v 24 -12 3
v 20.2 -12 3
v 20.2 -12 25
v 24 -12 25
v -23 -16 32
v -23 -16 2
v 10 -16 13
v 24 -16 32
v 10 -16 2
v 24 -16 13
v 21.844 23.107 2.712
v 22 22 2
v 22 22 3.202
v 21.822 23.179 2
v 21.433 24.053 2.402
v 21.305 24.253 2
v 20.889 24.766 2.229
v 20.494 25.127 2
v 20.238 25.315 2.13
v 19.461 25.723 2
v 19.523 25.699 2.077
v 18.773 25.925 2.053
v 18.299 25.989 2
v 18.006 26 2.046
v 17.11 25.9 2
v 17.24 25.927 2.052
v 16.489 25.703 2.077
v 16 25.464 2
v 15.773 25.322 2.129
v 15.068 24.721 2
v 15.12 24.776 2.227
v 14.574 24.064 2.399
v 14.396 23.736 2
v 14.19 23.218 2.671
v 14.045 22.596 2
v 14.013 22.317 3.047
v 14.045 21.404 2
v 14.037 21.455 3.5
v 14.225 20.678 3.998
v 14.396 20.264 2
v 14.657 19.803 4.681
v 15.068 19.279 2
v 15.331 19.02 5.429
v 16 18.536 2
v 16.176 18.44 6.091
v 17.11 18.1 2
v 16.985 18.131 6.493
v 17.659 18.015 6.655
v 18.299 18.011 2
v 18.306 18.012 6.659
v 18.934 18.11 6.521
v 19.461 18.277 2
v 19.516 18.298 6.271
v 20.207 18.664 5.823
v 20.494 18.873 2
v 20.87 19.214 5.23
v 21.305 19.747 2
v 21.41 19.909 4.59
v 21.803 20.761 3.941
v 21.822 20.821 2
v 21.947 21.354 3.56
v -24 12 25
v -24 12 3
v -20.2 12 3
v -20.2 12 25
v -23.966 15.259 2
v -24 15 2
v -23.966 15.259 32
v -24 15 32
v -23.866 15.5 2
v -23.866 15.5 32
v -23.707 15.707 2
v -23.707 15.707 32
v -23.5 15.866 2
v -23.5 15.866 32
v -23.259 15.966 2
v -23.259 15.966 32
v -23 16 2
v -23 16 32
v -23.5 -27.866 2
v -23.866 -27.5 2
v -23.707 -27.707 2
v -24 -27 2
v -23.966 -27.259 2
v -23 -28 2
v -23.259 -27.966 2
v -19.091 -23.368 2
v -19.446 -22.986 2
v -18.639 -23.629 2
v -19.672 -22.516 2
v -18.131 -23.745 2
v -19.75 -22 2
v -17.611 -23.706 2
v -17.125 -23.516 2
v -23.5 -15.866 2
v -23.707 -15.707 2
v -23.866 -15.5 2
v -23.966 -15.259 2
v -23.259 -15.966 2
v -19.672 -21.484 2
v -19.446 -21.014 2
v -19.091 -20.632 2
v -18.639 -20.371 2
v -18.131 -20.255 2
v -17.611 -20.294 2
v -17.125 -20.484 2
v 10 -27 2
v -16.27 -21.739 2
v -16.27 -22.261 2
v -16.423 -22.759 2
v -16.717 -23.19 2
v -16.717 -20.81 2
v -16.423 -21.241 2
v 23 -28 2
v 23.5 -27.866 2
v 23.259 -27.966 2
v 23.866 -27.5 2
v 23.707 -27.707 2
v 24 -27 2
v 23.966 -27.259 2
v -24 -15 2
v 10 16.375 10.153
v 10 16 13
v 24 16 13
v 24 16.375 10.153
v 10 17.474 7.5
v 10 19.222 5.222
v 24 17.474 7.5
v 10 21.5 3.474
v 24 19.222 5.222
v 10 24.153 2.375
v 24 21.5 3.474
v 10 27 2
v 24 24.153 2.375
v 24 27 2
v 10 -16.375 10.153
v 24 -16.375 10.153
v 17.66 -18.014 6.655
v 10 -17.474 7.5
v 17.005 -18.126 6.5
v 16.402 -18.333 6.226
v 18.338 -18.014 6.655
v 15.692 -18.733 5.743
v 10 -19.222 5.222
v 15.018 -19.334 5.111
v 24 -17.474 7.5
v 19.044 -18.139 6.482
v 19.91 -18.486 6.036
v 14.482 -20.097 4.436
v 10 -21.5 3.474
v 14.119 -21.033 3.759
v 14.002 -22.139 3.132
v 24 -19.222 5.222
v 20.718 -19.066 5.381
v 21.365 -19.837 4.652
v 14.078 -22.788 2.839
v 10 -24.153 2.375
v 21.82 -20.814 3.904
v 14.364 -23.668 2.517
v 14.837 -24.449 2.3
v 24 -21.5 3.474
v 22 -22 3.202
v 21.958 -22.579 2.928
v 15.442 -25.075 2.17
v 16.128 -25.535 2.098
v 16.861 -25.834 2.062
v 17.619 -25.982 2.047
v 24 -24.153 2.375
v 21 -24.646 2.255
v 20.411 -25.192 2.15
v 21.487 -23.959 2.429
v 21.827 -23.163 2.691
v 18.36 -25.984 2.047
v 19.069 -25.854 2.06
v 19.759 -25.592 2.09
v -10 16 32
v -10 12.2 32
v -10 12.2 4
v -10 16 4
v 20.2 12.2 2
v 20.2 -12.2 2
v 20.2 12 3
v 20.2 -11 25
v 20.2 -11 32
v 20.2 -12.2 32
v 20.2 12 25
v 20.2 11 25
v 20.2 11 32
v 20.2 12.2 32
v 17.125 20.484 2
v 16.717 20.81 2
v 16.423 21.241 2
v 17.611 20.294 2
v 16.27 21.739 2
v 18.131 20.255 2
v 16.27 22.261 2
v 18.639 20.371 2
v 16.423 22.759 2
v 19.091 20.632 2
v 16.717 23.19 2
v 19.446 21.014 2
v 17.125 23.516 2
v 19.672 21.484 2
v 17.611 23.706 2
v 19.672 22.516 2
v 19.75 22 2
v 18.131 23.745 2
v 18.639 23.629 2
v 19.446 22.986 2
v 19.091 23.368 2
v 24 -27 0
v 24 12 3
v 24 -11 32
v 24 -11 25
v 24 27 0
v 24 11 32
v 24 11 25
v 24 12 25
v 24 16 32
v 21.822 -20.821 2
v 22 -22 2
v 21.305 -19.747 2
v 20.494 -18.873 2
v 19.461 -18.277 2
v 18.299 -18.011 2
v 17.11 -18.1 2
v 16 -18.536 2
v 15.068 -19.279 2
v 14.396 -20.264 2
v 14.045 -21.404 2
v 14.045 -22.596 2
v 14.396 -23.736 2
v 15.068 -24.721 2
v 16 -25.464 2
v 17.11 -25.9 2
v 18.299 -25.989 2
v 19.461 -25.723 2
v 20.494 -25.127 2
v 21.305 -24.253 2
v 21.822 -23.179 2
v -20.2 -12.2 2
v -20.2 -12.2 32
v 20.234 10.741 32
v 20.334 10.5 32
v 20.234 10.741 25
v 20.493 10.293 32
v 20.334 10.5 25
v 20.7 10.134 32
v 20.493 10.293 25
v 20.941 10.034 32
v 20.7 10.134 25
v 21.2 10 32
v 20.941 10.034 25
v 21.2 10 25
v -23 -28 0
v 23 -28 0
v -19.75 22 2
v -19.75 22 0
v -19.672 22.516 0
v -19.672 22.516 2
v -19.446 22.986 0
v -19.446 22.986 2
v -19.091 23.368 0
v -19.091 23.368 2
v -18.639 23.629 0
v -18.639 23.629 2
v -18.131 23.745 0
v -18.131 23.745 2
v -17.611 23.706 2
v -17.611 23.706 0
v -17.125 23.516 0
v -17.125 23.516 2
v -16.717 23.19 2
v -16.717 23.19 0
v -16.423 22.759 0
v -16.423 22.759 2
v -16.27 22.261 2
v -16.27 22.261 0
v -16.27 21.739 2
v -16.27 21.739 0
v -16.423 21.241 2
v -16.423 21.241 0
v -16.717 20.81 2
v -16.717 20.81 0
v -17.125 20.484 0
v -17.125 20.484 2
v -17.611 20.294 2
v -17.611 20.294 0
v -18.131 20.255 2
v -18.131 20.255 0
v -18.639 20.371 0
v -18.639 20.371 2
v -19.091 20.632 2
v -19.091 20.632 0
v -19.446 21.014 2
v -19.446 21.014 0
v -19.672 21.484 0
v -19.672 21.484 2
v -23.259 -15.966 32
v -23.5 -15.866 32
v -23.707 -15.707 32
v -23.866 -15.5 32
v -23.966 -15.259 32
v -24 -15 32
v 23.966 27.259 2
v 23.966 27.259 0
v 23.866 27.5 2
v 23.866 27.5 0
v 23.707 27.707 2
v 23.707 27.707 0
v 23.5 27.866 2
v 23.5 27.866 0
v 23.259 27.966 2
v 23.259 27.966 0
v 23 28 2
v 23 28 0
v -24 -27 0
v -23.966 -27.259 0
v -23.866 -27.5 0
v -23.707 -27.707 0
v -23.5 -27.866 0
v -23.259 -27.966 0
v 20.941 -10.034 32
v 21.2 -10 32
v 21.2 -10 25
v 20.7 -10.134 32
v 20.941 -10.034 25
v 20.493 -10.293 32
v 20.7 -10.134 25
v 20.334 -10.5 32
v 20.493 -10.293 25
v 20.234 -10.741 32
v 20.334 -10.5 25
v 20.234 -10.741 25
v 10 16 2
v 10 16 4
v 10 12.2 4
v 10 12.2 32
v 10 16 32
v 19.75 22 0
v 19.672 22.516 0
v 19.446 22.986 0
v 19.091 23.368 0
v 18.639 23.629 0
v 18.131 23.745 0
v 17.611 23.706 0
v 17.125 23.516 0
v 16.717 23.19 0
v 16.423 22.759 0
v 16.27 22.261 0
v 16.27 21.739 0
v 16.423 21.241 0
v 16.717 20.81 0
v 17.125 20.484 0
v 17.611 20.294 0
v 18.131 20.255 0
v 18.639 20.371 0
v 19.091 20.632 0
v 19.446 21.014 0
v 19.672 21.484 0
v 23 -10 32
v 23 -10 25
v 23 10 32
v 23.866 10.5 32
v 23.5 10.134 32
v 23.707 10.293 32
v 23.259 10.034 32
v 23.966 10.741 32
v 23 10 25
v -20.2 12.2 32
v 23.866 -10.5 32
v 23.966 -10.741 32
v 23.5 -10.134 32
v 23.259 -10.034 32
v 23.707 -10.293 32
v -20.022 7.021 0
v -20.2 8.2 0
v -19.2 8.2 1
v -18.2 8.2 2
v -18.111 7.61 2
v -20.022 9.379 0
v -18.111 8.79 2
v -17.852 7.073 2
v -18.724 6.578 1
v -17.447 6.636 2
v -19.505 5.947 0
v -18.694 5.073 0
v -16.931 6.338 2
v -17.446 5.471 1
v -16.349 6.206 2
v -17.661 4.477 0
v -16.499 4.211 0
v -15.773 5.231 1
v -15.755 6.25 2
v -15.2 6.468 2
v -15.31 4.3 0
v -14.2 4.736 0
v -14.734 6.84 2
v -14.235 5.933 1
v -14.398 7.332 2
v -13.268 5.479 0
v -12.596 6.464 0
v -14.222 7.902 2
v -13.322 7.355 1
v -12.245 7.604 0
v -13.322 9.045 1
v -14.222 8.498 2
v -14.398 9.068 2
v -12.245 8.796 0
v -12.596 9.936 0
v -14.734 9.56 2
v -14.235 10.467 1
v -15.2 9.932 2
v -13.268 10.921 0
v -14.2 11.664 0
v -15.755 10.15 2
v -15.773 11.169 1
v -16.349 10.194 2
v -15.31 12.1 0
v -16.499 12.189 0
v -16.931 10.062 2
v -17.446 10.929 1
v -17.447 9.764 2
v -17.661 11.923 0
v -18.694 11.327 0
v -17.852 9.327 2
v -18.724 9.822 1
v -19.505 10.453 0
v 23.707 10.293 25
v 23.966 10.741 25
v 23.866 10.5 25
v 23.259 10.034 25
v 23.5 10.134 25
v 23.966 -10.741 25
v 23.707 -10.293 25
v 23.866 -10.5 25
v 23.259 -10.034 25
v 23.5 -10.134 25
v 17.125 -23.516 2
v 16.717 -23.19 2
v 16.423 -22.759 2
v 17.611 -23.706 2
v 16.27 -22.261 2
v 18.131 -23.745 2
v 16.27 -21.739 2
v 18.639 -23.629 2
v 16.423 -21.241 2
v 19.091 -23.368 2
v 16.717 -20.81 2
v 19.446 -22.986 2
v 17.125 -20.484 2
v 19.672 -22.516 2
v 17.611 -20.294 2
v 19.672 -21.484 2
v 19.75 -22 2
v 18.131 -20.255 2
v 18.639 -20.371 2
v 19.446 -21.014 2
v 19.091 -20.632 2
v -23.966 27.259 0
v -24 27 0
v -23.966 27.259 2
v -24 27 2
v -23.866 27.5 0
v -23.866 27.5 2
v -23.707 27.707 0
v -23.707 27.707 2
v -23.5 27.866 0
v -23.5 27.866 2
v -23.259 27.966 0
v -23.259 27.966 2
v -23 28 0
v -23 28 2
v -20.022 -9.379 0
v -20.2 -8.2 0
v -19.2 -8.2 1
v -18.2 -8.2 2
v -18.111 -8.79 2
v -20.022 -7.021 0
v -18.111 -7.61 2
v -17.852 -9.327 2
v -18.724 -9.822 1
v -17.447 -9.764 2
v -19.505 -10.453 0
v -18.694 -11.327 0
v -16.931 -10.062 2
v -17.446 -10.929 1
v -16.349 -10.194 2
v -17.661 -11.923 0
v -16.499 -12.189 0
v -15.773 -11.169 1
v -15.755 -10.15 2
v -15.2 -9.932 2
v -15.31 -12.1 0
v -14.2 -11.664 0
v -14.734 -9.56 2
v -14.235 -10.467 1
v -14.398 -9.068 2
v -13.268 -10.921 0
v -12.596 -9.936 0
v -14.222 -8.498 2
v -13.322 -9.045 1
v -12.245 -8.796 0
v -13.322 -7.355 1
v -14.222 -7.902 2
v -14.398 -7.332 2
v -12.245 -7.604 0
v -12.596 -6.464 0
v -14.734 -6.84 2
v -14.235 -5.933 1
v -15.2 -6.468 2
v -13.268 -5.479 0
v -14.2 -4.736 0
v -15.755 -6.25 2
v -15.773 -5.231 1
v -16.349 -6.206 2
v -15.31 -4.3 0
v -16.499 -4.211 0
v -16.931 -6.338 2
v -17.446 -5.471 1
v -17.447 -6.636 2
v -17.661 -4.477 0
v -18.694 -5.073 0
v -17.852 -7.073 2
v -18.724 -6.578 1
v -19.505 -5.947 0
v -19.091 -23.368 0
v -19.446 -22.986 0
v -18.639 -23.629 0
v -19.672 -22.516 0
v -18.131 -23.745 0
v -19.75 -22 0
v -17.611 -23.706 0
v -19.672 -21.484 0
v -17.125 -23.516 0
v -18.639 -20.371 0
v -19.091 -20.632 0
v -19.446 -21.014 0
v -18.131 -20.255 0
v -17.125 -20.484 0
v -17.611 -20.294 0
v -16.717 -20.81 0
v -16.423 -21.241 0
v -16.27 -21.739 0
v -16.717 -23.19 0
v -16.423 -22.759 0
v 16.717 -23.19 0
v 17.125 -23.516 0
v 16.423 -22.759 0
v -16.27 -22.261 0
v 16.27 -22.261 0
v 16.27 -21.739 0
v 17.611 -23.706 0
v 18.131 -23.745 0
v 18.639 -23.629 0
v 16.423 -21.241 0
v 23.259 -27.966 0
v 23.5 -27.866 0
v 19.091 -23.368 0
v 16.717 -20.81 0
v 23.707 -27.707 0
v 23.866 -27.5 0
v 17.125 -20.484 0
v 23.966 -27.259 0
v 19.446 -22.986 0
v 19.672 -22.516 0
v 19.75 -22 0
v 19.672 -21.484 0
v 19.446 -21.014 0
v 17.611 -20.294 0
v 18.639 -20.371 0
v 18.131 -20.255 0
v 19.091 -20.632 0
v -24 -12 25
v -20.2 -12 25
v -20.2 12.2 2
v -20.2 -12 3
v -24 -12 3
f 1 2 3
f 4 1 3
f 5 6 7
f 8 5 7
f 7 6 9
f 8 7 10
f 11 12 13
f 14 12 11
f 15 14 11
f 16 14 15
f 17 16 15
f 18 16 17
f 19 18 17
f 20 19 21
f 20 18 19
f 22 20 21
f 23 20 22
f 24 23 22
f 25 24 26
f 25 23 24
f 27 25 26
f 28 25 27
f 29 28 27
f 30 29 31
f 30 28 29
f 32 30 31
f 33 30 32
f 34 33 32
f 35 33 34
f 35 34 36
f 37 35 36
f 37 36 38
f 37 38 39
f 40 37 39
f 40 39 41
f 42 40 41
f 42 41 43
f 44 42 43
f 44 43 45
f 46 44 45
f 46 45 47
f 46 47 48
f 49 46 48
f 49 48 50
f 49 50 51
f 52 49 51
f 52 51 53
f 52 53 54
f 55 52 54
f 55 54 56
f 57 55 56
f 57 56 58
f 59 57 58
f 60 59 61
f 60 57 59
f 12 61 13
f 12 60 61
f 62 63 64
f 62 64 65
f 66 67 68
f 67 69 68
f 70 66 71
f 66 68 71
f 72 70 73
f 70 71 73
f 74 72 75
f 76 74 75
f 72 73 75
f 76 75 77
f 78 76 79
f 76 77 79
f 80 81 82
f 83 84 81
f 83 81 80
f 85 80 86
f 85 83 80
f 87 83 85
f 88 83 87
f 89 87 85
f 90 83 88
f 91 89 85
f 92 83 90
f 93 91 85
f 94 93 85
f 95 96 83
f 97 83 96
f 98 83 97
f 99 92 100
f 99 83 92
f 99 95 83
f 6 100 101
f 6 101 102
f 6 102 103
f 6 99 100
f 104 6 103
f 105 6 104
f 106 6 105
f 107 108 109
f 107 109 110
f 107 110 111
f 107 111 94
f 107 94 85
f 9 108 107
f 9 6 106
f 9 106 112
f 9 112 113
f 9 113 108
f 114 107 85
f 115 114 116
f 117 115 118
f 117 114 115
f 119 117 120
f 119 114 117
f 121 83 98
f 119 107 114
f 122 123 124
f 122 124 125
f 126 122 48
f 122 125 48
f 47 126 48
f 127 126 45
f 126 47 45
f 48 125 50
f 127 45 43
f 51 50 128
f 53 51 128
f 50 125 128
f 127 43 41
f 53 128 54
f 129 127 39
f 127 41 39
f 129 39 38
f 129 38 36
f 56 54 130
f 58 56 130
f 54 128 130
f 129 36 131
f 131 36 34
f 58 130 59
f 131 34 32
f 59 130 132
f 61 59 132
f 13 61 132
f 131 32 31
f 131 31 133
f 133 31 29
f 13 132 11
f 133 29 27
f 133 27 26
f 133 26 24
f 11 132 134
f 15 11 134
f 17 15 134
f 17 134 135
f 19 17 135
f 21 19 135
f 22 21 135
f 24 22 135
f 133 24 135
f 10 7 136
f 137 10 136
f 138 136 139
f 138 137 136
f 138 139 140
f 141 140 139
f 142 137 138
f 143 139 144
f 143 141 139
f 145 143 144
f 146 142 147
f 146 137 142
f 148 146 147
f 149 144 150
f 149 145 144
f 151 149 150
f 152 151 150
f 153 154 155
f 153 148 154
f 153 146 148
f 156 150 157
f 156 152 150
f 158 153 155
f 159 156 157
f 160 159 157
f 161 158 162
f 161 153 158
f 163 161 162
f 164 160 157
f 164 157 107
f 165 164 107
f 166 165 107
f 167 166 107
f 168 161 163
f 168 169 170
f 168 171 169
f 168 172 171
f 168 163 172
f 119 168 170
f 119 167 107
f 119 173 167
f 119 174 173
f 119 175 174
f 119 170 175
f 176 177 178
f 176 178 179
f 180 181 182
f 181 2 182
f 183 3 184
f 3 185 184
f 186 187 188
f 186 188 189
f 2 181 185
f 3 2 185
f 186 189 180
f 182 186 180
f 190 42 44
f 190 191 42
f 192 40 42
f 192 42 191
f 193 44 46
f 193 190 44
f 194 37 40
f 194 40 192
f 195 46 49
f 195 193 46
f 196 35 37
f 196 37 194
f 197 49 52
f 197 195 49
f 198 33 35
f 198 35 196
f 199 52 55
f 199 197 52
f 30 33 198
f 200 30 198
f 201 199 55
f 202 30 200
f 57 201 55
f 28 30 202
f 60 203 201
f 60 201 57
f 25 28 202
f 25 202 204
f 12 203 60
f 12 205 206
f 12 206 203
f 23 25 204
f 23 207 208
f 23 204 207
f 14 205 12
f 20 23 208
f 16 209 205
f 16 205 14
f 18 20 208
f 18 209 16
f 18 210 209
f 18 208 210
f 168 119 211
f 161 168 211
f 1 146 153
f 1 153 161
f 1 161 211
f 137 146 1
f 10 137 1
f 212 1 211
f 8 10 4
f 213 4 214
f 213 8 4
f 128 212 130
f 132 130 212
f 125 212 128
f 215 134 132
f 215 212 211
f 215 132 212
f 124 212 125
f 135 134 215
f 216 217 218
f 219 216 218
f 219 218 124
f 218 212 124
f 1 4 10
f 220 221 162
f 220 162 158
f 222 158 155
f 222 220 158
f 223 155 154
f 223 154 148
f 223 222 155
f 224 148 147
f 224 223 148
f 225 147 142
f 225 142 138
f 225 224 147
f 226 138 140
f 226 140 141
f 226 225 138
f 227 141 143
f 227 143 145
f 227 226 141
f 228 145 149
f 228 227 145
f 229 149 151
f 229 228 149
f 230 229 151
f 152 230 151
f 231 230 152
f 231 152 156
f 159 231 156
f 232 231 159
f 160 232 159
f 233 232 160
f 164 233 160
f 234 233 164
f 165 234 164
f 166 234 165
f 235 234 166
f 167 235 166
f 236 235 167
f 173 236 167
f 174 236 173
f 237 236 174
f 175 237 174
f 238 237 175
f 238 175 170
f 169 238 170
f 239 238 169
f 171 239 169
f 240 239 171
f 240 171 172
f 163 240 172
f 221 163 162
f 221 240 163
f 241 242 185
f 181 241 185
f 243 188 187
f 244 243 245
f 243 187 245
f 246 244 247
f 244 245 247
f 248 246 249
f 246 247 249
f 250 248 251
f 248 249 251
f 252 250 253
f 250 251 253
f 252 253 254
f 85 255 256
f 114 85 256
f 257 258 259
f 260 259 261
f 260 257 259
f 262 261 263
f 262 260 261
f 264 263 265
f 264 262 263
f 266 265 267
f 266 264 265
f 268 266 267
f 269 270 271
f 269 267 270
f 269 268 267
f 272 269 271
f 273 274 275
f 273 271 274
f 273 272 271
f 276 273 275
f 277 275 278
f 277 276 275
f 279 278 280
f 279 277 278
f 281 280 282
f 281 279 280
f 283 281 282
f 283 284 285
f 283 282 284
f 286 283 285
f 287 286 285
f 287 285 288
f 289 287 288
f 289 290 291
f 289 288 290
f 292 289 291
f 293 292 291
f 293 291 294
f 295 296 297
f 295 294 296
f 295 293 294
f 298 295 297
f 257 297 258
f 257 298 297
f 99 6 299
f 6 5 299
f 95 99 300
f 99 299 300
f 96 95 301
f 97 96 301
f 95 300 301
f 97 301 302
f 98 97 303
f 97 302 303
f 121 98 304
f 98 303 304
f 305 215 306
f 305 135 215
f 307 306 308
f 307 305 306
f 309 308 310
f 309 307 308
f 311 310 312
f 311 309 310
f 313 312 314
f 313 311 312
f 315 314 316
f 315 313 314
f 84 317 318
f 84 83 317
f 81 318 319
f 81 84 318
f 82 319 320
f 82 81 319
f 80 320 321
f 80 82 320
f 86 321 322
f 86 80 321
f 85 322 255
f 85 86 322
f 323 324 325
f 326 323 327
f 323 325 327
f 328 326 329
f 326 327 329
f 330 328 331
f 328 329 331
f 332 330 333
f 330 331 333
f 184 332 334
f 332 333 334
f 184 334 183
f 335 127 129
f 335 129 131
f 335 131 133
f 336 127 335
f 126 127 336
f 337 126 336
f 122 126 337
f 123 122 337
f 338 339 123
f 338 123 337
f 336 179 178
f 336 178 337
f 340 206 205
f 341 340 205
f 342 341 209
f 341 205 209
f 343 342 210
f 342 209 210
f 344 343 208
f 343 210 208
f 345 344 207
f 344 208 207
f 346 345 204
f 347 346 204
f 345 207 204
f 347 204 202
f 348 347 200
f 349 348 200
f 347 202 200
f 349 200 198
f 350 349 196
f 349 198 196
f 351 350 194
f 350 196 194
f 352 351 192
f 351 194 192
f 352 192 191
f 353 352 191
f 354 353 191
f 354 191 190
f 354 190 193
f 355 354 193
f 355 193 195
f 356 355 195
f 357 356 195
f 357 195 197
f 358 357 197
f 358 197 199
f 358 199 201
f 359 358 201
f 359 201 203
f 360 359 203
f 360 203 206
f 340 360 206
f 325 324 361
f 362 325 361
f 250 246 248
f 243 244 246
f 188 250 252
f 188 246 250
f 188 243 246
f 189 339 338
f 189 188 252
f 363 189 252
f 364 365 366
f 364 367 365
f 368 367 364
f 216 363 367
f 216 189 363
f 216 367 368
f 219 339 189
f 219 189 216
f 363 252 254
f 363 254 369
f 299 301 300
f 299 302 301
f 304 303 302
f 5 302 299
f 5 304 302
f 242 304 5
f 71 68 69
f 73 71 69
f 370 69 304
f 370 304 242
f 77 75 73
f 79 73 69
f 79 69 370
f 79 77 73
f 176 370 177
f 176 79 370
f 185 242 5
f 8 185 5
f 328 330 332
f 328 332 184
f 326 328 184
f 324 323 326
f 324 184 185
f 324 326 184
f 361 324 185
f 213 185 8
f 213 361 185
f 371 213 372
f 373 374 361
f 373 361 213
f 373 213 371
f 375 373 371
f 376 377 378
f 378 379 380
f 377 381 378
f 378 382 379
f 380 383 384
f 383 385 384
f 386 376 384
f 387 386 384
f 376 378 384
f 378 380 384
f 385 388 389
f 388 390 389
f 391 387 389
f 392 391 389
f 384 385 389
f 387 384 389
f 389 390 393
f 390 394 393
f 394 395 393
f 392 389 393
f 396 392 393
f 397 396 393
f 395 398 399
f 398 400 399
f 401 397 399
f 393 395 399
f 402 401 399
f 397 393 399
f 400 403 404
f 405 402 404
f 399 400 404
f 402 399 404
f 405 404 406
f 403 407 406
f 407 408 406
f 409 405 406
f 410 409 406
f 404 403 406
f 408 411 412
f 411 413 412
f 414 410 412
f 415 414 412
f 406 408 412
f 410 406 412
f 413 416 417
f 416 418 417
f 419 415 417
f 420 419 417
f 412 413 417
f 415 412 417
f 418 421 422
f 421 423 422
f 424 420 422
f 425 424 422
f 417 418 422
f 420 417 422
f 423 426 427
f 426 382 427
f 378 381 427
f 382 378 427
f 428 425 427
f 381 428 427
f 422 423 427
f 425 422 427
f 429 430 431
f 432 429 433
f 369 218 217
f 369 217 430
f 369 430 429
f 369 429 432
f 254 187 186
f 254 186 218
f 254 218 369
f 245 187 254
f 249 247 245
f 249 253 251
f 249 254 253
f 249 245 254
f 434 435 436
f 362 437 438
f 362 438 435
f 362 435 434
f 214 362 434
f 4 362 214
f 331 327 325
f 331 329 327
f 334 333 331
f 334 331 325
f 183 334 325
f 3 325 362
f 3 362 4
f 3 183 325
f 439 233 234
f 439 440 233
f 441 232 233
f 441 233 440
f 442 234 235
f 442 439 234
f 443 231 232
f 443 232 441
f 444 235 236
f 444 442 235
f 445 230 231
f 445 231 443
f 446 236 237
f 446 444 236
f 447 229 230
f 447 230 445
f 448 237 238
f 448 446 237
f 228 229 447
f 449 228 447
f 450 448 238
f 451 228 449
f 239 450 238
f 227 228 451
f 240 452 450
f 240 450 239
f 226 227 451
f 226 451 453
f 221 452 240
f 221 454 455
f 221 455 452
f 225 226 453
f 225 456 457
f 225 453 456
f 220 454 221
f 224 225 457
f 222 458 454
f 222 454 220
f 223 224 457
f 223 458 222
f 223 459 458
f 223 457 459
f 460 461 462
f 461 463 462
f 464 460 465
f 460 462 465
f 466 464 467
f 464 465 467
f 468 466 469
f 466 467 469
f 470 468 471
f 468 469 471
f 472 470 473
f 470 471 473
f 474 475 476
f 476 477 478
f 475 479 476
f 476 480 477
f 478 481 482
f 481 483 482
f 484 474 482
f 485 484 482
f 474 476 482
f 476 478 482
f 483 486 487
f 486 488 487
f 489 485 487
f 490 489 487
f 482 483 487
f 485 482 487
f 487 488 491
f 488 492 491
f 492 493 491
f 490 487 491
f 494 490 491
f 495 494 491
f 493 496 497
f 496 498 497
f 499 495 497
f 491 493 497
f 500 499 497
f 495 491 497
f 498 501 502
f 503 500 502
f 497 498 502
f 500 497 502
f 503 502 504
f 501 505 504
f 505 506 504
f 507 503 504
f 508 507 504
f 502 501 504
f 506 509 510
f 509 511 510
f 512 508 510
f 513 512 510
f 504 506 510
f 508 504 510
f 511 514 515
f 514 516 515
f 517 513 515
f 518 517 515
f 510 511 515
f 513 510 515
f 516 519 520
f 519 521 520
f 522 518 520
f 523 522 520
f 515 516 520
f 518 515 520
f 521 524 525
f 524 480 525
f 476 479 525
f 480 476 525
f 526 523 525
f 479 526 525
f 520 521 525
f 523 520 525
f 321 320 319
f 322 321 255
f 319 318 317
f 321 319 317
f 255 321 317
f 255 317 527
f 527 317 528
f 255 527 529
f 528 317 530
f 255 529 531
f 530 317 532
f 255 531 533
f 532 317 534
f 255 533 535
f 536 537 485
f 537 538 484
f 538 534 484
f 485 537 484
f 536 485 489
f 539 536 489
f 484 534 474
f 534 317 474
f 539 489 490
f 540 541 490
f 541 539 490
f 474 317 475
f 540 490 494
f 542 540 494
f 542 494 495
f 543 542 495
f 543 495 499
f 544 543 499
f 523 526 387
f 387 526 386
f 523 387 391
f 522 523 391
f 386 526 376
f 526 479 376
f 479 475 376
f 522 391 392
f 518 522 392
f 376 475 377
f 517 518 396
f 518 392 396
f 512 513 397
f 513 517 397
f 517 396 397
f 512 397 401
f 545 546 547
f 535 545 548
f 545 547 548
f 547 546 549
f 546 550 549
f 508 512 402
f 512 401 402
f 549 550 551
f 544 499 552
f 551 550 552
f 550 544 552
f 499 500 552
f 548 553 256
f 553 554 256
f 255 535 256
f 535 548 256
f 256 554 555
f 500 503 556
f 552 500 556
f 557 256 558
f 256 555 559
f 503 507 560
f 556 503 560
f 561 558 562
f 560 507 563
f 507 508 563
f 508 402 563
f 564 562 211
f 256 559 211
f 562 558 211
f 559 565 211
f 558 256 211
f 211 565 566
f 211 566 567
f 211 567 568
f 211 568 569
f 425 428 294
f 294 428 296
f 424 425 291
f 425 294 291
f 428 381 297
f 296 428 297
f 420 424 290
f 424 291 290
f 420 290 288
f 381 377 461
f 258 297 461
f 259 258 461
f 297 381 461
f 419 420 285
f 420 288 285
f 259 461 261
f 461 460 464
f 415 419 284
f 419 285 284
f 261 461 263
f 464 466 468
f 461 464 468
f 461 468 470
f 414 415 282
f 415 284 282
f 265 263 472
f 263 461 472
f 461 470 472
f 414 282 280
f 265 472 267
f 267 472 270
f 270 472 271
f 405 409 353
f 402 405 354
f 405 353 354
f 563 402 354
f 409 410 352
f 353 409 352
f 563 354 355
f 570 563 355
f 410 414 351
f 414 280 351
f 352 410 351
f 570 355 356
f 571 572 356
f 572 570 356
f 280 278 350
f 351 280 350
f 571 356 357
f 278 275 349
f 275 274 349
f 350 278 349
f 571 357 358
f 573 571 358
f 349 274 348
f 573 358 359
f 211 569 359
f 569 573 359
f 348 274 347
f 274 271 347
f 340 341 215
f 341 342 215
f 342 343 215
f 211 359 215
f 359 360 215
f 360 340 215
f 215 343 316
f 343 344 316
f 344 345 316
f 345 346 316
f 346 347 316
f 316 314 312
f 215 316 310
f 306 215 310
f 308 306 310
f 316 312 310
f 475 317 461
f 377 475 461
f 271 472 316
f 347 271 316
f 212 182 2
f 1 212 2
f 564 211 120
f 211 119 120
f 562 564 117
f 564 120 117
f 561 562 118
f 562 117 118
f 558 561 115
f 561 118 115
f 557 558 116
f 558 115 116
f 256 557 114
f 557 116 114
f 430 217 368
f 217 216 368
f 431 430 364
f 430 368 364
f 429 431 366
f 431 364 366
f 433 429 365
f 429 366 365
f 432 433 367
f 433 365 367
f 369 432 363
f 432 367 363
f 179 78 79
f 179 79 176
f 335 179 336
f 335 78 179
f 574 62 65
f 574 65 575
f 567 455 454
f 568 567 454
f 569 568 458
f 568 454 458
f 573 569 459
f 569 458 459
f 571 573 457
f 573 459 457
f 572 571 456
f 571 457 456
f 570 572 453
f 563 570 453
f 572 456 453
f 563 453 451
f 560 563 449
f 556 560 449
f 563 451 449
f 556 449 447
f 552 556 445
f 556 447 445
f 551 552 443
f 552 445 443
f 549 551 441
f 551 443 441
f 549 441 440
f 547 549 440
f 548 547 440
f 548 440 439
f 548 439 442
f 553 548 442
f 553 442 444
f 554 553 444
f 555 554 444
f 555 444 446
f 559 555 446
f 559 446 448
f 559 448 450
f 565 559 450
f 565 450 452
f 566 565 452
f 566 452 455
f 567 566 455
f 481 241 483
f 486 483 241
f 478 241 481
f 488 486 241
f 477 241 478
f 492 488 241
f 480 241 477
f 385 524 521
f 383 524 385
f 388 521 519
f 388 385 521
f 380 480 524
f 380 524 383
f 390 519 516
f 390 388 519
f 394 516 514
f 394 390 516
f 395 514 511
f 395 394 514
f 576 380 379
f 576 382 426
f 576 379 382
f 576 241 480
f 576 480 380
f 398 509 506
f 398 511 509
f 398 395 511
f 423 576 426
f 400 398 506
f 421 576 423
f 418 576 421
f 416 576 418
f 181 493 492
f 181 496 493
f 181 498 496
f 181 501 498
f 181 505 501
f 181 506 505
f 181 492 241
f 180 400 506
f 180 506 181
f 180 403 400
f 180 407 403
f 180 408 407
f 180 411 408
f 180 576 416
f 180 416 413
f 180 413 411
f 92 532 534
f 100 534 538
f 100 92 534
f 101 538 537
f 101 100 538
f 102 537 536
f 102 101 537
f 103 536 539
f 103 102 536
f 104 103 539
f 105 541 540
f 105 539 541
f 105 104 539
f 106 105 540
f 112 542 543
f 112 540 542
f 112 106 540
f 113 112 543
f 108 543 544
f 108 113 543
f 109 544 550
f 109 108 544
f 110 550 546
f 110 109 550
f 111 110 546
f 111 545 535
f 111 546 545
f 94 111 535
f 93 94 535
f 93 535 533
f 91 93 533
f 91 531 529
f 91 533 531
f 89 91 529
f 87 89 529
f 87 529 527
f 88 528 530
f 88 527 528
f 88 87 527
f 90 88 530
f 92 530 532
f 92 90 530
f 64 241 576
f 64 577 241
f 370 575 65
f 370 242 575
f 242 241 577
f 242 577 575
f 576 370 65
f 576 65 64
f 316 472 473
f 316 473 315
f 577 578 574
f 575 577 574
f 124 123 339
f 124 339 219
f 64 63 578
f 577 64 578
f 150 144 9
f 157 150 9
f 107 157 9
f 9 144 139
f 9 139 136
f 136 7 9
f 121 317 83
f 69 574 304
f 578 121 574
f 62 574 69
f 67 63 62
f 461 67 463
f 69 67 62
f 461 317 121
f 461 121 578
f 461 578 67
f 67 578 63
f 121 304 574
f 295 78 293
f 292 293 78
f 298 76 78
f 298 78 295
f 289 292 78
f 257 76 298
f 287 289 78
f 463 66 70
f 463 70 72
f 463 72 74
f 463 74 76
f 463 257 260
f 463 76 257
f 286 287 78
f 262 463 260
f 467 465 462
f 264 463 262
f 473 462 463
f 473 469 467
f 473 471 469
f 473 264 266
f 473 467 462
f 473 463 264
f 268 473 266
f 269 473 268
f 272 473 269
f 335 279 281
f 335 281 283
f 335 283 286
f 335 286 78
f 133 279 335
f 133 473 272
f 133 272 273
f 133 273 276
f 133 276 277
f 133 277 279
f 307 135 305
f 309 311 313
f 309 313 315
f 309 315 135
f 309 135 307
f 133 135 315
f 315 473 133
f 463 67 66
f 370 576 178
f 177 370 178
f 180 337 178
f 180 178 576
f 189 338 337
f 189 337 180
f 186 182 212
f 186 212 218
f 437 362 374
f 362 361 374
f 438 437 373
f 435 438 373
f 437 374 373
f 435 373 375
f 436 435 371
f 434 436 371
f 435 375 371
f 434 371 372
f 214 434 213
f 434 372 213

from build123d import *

# Parameters (mm, degrees)
SKETCH107_W         = 48
SKETCH107_H         = 56
PAD026_DEPTH        = 2
SKETCH108_R         = 1.75
HOLE046_DEPTH       = 25
SKETCH109_W         = 48
SKETCH109_H         = 32
PAD027_DEPTH        = 30
SKETCH110_W         = 40.4
SKETCH110_H         = 24.4
POCKET033_DEPTH     = 30
SKETCH111_W         = 20
SKETCH111_H         = 20
SKETCH111_W_2       = 40
POCKET034_DEPTH     = 28
SKETCH112_W         = 24
SKETCH112_H         = 22
POCKET035_DEPTH     = 50
SKETCH113_R         = 1.75
HOLE047_DEPTH       = 25
HOLE048_D           = 3.5
HOLE048_DEPTH       = 25
HOLE048_CSINK_D     = 8
HOLE048_CSINK_ANGLE = 90
HOLE048_TIPS_R      = 1.75
FILLET037_R         = 1
PAD_DEPTH           = 14
SKETCH115_R         = 4
HOLE_DEPTH          = 25
HOLE_TIPS_R         = 4
FILLET_R            = 1
FILLET038_R         = 1
FILLET039_R         = 1


with BuildPart() as part:
    # Sketch107 → Pad026 (new body)
    with BuildSketch(Plane.XY):
        Rectangle(SKETCH107_W, SKETCH107_H)
    extrude(amount=PAD026_DEPTH)

    # Sketch108 (on Face6 of Pad026) → Hole046 (cut)
    with BuildSketch(Plane.XY.offset(2)):
        with Locations((18, 22)):
            Circle(SKETCH108_R)
        with Locations((18, -22)):
            Circle(SKETCH108_R)
    hole046 = extrude(amount=-HOLE046_DEPTH, mode=Mode.SUBTRACT)

    # Mirrored041: Hole046 across Sketch108 V_Axis
    add(hole046.mirror(Plane(origin=(0, 0, 2), x_dir=(0, 0, 1), z_dir=(1, 0, 0))), mode=Mode.SUBTRACT)

    # Sketch109 (on Face5 of Mirrored041) → Pad027 (join)
    with BuildSketch(Plane.XY.offset(2)):
        Rectangle(SKETCH109_W, SKETCH109_H)
    extrude(amount=PAD027_DEPTH)

    # Sketch110 (on Face12 of Pad027) → Pocket033 (cut)
    with BuildSketch(Plane.XY.offset(32)):
        Rectangle(SKETCH110_W, SKETCH110_H)
    extrude(amount=-POCKET033_DEPTH, mode=Mode.SUBTRACT)

    # Sketch111 (on Face8 of Pocket033) → Pocket034 (cut)
    with BuildSketch(Plane.XY.offset(32)):
        with Locations((0, 10)):
            Rectangle(SKETCH111_W, SKETCH111_H)
        with Locations((20, 0)):
            Rectangle(SKETCH111_W_2, SKETCH111_H)
    extrude(amount=-POCKET034_DEPTH, mode=Mode.SUBTRACT)

    # Sketch112 (on Face3 of Pocket034) → Pocket035 (cut)
    with BuildSketch(Plane(origin=(-24, 0, 0), x_dir=(0, -1, 0), z_dir=(-1, 0, 0))):
        with Locations((0, 14)):
            Rectangle(SKETCH112_W, SKETCH112_H)
    extrude(amount=-POCKET035_DEPTH, mode=Mode.SUBTRACT)

    # Sketch113 (on Face34 of Pocket035) → Hole047 (cut)
    with BuildSketch(Plane.XY.offset(2)):
        with Locations((-16.2, 8.2)):
            Circle(SKETCH113_R)
        with Locations((-16.2, -8.2)):
            Circle(SKETCH113_R)
    extrude(amount=-HOLE047_DEPTH, mode=Mode.SUBTRACT)

    # Hole048
    with Locations(Plane(origin=(0, 0, 0), x_dir=(1, 0, 0), z_dir=(0, 0, -1))):
        with Locations((-16.2, -8.2), (-16.2, 8.2)):
            CounterSinkHole(HOLE048_D / 2, HOLE048_CSINK_D / 2, depth=HOLE048_DEPTH, counter_sink_angle=HOLE048_CSINK_ANGLE)

    # Hole048 tips → Hole048 tip 1 section 0
    with BuildSketch(Plane(origin=(0, 0, 25), x_dir=(1, 0, 0), z_dir=(0, 0, -1)), mode=Mode.PRIVATE) as hole048_tip_1_s0:
        with Locations((-16.2, -8.2)):
            Circle(HOLE048_TIPS_R)
    loft([hole048_tip_1_s0.sketch, Vertex(-16.2, 8.2, 26.051506)], mode=Mode.SUBTRACT)

    # Hole048 tips → Hole048 tip 2 section 0
    with BuildSketch(Plane(origin=(0, 0, 25), x_dir=(1, 0, 0), z_dir=(0, 0, -1)), mode=Mode.PRIVATE) as hole048_tip_2_s0:
        with Locations((-16.2, 8.2)):
            Circle(HOLE048_TIPS_R)
    loft([hole048_tip_2_s0.sketch, Vertex(-16.2, -8.2, 26.051506)], mode=Mode.SUBTRACT)

    # Fillet037
    fillet037_edges = [part.edges().sort_by_distance(p)[0] for p in [
        (24, -28, 1),
        (24, 28, 1),
        (-24, -28, 1),
        (-24, 28, 1),
    ]]
    fillet(fillet037_edges, radius=FILLET037_R)

    # Sketch (on Face10 of Fillet037) → Pad (join)
    with BuildSketch(Plane.YZ.offset(24)):
        with BuildLine():
            ThreePointArc((16, 12.999996), (19.221827, 5.221824), (27, 2))
            Line((16, 2), (27, 2))
            Line((16, 12.999996), (16, 2))
        make_face()
    pad = extrude(amount=-PAD_DEPTH)

    # Mirrored: Pad across Sketch V_Axis
    add(pad.mirror(Plane(origin=(24, 0, 0), x_dir=(1, 0, 0), z_dir=(0, 1, 0))))

    # Sketch115 (on Face5 of Pad) → Hole (cut)
    with BuildSketch(Plane.XY.offset(2)):
        with Locations((18, 22)):
            Circle(SKETCH115_R)
        with Locations((18, -22)):
            Circle(SKETCH115_R)
    extrude(amount=HOLE_DEPTH, mode=Mode.SUBTRACT)

    # Hole tips → Hole tip 1 section 0
    with BuildSketch(Plane.XY.offset(27), mode=Mode.PRIVATE) as hole_tip_1_s0:
        with Locations((18, 22)):
            Circle(HOLE_TIPS_R)
    loft([hole_tip_1_s0.sketch, Vertex(18, 22, 29.403442)], mode=Mode.SUBTRACT)

    # Hole tips → Hole tip 2 section 0
    with BuildSketch(Plane.XY.offset(27), mode=Mode.PRIVATE) as hole_tip_2_s0:
        with Locations((18, -22)):
            Circle(HOLE_TIPS_R)
    loft([hole_tip_2_s0.sketch, Vertex(18, -22, 29.403442)], mode=Mode.SUBTRACT)

    # Fillet
    fillet_edges = [part.edges().sort_by_distance(p)[0] for p in [
        (-24, -16, 17),
        (-24, 16, 17),
    ]]
    fillet(fillet_edges, radius=FILLET_R)

    # Fillet038
    fillet038_edges = [part.edges().sort_by_distance(p)[0] for p in [
        (20.2, 10, 28.5),
        (20.2, -10, 28.5),
    ]]
    fillet(fillet038_edges, radius=FILLET038_R)

    # Fillet039
    fillet039_edges = [part.edges().sort_by_distance(p)[0] for p in [
        (24, 10, 28.5),
        (24, -10, 28.5),
    ]]
    fillet(fillet039_edges, radius=FILLET039_R)


solid = part.part
